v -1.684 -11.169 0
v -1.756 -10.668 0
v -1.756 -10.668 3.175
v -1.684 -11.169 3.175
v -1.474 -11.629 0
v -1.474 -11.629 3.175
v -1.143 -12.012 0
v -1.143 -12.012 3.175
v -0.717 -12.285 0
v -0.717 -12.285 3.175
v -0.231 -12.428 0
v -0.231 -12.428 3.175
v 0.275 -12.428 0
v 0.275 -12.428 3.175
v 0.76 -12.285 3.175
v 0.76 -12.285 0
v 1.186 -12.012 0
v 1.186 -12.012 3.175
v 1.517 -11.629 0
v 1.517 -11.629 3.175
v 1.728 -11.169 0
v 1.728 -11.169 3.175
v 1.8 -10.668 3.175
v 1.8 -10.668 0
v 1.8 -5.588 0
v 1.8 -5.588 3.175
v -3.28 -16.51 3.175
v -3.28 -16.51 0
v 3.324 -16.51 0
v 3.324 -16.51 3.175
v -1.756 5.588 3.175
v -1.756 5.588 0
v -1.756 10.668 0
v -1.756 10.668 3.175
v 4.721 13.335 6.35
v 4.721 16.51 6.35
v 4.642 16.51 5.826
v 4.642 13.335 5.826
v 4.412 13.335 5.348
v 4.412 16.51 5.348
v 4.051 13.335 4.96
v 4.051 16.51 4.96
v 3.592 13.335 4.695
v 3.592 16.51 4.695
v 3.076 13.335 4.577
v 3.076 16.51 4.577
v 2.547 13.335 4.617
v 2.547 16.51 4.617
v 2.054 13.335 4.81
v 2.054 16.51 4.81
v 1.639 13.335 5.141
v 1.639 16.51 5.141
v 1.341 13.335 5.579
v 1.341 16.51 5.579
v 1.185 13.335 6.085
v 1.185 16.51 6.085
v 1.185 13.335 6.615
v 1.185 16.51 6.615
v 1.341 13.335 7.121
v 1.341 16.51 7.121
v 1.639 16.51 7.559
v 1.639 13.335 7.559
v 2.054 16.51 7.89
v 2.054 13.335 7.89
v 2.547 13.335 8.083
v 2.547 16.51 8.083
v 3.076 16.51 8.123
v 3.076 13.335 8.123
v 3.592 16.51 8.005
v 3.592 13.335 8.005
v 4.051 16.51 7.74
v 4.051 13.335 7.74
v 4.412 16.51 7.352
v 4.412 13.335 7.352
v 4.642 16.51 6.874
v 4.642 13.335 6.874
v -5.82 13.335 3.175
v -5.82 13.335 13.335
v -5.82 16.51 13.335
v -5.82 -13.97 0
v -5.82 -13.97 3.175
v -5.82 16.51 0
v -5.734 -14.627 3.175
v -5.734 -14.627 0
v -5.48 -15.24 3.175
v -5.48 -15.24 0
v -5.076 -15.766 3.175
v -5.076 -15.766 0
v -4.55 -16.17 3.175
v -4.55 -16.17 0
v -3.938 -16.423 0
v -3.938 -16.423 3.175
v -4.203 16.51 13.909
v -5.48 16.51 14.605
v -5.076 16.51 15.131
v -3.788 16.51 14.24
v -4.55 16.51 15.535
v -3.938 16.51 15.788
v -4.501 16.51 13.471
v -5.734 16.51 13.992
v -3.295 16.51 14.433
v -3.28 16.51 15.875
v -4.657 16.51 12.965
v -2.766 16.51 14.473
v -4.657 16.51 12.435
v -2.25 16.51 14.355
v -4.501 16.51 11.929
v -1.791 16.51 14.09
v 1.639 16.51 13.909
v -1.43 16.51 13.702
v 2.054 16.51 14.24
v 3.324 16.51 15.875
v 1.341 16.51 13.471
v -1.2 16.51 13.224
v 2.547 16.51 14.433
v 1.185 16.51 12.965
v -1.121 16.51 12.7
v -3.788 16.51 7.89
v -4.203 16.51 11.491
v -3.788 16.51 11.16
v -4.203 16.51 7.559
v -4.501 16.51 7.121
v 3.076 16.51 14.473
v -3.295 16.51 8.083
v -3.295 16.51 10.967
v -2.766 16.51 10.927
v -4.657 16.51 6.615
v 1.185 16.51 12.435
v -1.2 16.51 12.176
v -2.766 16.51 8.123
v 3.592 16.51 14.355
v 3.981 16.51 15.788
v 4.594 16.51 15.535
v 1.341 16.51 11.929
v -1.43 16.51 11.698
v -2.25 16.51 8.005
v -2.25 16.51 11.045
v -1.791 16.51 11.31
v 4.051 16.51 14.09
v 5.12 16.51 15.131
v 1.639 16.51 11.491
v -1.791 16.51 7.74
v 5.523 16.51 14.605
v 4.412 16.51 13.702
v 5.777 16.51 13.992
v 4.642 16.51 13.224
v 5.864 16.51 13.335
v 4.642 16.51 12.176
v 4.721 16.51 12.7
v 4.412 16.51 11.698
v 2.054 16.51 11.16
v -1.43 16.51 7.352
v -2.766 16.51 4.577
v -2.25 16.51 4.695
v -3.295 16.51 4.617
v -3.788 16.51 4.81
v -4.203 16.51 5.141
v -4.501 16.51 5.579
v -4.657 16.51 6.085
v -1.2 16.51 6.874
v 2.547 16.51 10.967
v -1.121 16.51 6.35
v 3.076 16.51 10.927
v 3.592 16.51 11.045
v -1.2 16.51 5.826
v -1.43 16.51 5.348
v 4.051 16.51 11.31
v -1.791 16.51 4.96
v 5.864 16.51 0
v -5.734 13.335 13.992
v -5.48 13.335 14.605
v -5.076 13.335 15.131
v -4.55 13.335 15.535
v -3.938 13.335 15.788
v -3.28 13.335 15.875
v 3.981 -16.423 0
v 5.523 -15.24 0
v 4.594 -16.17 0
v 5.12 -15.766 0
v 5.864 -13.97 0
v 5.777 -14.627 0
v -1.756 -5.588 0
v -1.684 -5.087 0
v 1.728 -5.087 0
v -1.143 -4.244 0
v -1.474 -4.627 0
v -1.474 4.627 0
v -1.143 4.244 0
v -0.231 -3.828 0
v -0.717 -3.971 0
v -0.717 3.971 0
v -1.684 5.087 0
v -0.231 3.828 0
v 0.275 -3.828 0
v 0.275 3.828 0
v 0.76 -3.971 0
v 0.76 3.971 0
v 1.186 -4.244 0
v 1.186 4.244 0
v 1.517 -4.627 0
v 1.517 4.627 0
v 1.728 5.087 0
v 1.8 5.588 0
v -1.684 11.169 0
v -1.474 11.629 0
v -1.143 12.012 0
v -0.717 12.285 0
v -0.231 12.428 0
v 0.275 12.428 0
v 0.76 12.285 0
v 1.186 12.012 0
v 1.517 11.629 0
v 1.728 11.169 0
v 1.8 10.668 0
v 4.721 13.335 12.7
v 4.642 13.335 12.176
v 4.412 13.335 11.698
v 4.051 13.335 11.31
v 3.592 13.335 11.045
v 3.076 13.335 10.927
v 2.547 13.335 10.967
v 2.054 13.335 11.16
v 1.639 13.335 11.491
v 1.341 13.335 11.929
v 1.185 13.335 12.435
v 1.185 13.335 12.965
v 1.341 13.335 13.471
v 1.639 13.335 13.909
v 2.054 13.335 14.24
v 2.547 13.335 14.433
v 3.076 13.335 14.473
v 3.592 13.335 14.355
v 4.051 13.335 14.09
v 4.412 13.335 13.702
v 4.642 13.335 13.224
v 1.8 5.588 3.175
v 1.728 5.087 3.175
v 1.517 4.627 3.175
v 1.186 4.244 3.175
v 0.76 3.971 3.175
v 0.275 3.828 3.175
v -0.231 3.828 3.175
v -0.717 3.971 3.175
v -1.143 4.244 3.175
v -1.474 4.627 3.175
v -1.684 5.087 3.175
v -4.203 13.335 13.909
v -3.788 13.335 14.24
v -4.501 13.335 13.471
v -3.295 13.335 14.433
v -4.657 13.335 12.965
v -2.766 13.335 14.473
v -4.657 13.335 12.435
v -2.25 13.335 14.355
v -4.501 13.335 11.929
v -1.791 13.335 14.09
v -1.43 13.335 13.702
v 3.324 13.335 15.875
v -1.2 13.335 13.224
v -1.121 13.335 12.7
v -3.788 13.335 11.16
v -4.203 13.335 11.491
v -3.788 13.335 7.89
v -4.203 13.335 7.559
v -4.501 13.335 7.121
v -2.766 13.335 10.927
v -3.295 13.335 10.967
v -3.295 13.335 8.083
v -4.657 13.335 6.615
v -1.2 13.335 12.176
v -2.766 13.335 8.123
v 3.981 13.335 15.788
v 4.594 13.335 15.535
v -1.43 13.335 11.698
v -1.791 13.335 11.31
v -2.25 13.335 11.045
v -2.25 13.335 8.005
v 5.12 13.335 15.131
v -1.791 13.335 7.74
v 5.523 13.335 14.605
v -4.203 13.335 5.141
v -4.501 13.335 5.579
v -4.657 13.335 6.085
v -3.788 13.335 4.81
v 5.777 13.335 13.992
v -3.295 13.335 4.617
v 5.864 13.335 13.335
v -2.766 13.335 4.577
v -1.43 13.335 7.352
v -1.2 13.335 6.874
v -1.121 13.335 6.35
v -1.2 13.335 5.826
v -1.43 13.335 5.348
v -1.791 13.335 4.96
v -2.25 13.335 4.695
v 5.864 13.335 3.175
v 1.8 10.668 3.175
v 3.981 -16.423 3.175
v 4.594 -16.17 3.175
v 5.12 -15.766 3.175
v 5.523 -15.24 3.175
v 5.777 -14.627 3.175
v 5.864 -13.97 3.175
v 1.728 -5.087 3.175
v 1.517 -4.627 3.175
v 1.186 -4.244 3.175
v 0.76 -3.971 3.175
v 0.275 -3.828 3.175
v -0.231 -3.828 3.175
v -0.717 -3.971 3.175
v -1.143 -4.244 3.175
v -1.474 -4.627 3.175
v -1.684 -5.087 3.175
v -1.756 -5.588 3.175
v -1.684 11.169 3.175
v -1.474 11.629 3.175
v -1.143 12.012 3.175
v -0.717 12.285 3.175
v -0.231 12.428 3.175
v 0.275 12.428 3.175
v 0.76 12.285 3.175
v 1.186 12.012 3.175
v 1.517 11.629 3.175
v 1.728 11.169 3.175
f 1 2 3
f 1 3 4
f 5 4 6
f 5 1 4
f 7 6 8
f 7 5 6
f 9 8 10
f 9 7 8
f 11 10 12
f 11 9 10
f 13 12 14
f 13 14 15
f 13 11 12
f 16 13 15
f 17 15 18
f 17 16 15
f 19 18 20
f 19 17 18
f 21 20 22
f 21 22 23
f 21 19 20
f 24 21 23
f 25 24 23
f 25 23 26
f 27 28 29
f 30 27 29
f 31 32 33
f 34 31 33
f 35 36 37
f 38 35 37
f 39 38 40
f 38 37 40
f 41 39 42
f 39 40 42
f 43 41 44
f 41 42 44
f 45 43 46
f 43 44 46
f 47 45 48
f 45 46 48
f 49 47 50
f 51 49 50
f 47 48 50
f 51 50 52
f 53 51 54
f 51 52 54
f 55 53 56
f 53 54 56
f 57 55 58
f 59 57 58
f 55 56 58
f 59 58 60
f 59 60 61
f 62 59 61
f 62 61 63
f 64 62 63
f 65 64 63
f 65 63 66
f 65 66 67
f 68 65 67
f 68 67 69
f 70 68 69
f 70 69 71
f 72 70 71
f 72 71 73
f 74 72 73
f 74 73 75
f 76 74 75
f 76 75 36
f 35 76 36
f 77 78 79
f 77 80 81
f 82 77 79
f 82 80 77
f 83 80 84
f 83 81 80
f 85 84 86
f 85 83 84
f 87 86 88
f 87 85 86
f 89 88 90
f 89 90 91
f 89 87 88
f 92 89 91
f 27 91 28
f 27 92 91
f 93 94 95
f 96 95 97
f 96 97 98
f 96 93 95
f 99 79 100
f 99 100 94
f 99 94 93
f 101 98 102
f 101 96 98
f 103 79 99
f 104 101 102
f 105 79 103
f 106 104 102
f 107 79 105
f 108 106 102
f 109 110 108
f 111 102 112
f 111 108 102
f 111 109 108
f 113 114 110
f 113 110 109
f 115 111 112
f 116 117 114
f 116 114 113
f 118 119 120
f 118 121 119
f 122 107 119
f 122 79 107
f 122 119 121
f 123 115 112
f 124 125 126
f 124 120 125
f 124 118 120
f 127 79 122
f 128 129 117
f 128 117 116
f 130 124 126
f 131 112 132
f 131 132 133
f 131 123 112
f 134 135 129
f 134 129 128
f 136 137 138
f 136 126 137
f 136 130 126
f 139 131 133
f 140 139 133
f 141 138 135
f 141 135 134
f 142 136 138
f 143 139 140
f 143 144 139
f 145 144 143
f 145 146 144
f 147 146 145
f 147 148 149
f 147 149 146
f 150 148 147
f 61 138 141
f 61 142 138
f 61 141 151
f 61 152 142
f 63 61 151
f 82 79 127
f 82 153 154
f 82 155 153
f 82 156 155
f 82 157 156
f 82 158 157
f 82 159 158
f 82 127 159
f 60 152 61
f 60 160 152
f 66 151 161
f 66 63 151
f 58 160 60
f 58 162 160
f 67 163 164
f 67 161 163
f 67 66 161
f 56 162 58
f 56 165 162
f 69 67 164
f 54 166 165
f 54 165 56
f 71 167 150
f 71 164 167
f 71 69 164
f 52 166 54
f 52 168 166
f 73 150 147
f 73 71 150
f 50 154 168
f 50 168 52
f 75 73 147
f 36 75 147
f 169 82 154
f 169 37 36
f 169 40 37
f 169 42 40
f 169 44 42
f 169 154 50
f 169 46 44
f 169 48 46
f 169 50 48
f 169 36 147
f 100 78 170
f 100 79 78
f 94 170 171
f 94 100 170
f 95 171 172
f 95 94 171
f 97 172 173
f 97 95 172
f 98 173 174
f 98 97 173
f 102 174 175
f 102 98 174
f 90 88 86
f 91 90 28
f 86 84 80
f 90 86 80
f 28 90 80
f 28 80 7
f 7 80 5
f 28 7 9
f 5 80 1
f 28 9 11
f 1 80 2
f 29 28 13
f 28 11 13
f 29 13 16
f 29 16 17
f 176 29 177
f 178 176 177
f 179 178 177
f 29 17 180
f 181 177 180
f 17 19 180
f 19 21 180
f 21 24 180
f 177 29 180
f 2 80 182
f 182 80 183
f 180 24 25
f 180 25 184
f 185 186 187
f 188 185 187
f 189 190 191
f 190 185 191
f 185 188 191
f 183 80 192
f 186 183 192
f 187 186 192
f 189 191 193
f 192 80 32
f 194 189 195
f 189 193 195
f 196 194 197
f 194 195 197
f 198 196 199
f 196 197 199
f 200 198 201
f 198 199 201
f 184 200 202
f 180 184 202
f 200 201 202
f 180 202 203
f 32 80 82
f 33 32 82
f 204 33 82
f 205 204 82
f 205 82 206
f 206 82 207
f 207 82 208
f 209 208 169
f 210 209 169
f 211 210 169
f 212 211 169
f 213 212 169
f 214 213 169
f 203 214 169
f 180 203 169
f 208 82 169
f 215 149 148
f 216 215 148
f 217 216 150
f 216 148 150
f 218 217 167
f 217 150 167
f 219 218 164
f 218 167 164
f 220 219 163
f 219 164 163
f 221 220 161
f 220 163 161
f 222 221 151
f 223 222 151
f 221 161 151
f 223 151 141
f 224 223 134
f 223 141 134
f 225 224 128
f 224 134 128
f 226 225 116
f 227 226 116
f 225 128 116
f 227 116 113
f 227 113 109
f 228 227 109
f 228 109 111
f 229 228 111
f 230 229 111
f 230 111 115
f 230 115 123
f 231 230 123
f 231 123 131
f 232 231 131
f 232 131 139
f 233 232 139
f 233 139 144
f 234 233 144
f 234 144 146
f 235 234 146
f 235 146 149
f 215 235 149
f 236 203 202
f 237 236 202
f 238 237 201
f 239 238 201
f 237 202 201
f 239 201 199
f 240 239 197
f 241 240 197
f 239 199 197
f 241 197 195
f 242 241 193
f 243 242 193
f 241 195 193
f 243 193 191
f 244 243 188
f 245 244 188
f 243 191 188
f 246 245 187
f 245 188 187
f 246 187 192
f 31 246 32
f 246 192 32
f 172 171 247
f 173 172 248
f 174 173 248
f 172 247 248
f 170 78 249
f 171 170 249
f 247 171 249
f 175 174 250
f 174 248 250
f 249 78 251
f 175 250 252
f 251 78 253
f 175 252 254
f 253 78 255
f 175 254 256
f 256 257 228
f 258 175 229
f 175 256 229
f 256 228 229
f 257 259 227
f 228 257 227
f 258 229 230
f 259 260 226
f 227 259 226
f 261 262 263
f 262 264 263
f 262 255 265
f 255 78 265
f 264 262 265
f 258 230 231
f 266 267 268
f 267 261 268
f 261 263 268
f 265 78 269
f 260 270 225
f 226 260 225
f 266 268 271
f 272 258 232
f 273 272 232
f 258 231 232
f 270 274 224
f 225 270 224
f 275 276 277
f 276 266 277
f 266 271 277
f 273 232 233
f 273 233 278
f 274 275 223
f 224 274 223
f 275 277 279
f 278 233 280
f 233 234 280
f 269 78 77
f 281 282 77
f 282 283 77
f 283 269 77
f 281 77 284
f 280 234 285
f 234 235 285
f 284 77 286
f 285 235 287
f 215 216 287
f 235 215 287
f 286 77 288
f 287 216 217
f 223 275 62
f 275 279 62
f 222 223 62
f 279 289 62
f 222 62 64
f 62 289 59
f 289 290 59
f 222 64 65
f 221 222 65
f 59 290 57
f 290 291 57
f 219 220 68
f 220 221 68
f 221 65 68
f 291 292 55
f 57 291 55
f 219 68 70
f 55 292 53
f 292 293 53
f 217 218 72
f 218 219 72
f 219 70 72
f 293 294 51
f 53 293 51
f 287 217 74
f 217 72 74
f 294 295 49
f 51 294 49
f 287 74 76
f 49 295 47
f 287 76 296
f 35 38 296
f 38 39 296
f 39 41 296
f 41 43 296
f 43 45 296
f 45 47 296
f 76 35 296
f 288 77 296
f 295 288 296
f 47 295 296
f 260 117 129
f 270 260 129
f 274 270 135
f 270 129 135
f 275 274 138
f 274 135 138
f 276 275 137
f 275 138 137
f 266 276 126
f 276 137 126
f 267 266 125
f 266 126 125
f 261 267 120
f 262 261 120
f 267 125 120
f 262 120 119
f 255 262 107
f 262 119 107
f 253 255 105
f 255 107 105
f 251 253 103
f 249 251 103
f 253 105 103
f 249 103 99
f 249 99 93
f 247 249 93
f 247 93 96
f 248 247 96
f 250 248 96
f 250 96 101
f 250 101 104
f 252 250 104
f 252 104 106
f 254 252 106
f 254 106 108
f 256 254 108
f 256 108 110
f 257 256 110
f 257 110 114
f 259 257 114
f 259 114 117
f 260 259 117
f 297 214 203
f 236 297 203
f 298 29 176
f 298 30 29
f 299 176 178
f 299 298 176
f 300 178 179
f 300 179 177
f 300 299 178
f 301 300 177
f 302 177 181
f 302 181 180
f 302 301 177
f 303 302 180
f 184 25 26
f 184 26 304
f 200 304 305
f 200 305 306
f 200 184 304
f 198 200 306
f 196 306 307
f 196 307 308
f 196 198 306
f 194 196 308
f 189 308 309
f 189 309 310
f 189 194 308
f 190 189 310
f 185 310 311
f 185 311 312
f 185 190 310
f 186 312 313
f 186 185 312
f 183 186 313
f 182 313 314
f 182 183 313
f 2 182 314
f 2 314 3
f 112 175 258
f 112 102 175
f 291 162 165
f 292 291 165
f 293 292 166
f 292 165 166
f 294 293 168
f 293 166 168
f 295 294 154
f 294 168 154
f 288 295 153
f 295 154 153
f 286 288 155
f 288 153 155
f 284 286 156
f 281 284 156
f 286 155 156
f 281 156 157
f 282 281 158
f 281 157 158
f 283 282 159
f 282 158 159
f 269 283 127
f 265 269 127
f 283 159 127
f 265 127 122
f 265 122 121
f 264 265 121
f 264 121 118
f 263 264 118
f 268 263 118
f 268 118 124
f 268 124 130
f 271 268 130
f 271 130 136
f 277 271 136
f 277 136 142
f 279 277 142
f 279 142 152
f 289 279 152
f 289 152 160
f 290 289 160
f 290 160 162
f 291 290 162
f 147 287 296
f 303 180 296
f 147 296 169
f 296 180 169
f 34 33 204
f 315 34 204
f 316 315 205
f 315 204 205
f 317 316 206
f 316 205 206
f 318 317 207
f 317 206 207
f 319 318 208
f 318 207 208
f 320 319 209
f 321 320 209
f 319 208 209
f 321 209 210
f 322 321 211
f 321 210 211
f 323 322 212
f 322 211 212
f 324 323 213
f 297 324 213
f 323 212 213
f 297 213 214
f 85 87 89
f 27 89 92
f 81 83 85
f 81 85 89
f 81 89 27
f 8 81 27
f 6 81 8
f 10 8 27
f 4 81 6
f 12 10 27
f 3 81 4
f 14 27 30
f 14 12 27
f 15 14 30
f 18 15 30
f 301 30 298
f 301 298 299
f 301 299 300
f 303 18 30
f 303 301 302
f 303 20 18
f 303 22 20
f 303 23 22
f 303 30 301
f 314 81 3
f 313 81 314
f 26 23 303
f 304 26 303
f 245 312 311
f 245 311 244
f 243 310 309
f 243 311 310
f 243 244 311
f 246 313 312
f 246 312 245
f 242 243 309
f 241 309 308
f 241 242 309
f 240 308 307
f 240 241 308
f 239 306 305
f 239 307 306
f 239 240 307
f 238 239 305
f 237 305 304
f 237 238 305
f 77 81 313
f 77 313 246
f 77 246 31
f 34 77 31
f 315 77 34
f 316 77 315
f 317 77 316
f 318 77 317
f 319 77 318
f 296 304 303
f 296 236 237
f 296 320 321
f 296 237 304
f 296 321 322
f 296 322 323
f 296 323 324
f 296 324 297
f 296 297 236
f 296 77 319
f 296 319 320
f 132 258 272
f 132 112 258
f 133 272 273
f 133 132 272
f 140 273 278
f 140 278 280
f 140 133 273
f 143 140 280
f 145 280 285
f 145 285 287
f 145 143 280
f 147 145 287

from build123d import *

# Parameters (mm, degrees)
SKETCH1_W           = 11.684
SKETCH1_H           = 33.02
BOSS_EXTRUDE1_DEPTH = 3.175
SKETCH2_W           = 11.684
SKETCH2_H           = 3.175
BOSS_EXTRUDE2_DEPTH = 12.7
CUT_EXTRUDE2_REACH  = 35.02
SKETCH3_R           = 1.778
FILLET2_R           = 2.54


with BuildPart() as part:
    # Sketch1 → Boss-Extrude1 (new body)
    with BuildSketch(Plane.XY):
        with Locations((0.021673222, 0)):
            Rectangle(SKETCH1_W, SKETCH1_H)
        with BuildLine():
            Line((-1.756326778, 5.588), (-1.756326778, 10.668))
            ThreePointArc((-1.756326778, 10.668), (0.021673222, 12.446), (1.799673222, 10.668))
            Line((1.799673222, 10.668), (1.799673222, 5.588))
            ThreePointArc((1.799673222, 5.588), (0.021673222, 3.81), (-1.756326778, 5.588))
        make_face(mode=Mode.SUBTRACT)
        with BuildLine():
            Line((-1.756326778, -5.588), (-1.756326778, -10.668))
            ThreePointArc((-1.756326778, -10.668), (0.021673222, -12.446), (1.799673222, -10.668))
            Line((1.799673222, -10.668), (1.799673222, -5.588))
            ThreePointArc((1.799673222, -5.588), (0.021673222, -3.81), (-1.756326778, -5.588))
        make_face(mode=Mode.SUBTRACT)
    extrude(amount=BOSS_EXTRUDE1_DEPTH)

    # Sketch2 → Boss-Extrude2 (add)
    with BuildSketch(Plane.XY.offset(3.175)):
        with Locations((0.021673222, 14.9225)):
            Rectangle(SKETCH2_W, SKETCH2_H)
    extrude(amount=BOSS_EXTRUDE2_DEPTH)

    # Sketch3 → Cut-Extrude2 (cut, up to next)
    with BuildSketch(Plane(origin=(0, 16.51, 0), x_dir=(1, 0, 0), z_dir=(0, 1, 0)), mode=Mode.PRIVATE) as cut_extrude2_sk1:
        with Locations((-2.899326778, -6.35)):
            Circle(SKETCH3_R)
    cut_extrude2_tool1 = extrude(cut_extrude2_sk1.sketch, amount=-CUT_EXTRUDE2_REACH, mode=Mode.PRIVATE) & part.part
    add(cut_extrude2_tool1.solids().sort_by_distance((-2.899327, 16.51, 6.35))[0], mode=Mode.SUBTRACT)
    # Sketch3 → Cut-Extrude2 (cut, up to next)
    with BuildSketch(Plane(origin=(0, 16.51, 0), x_dir=(1, 0, 0), z_dir=(0, 1, 0)), mode=Mode.PRIVATE) as cut_extrude2_sk2:
        with Locations((2.942673222, -6.35)):
            Circle(SKETCH3_R)
    cut_extrude2_tool2 = extrude(cut_extrude2_sk2.sketch, amount=-CUT_EXTRUDE2_REACH, mode=Mode.PRIVATE) & part.part
    add(cut_extrude2_tool2.solids().sort_by_distance((2.942673, 16.51, 6.35))[0], mode=Mode.SUBTRACT)
    # Sketch3 → Cut-Extrude2 (cut, up to next)
    with BuildSketch(Plane(origin=(0, 16.51, 0), x_dir=(1, 0, 0), z_dir=(0, 1, 0)), mode=Mode.PRIVATE) as cut_extrude2_sk3:
        with Locations((-2.899326778, -12.7)):
            Circle(SKETCH3_R)
    cut_extrude2_tool3 = extrude(cut_extrude2_sk3.sketch, amount=-CUT_EXTRUDE2_REACH, mode=Mode.PRIVATE) & part.part
    add(cut_extrude2_tool3.solids().sort_by_distance((-2.899327, 16.51, 12.7))[0], mode=Mode.SUBTRACT)
    # Sketch3 → Cut-Extrude2 (cut, up to next)
    with BuildSketch(Plane(origin=(0, 16.51, 0), x_dir=(1, 0, 0), z_dir=(0, 1, 0)), mode=Mode.PRIVATE) as cut_extrude2_sk4:
        with Locations((2.942673222, -12.7)):
            Circle(SKETCH3_R)
    cut_extrude2_tool4 = extrude(cut_extrude2_sk4.sketch, amount=-CUT_EXTRUDE2_REACH, mode=Mode.PRIVATE) & part.part
    add(cut_extrude2_tool4.solids().sort_by_distance((2.942673, 16.51, 12.7))[0], mode=Mode.SUBTRACT)

    # Fillet2
    fillet2_edges = [part.edges().sort_by_distance(p)[0] for p in [
        (-5.820326778, 14.9225, 15.875),
        (5.863673222, 14.9225, 15.875),
        (5.863673222, -16.51, 1.5875),
        (-5.820326778, -16.51, 1.5875),
    ]]
    fillet(fillet2_edges, radius=FILLET2_R)


solid = part.part
